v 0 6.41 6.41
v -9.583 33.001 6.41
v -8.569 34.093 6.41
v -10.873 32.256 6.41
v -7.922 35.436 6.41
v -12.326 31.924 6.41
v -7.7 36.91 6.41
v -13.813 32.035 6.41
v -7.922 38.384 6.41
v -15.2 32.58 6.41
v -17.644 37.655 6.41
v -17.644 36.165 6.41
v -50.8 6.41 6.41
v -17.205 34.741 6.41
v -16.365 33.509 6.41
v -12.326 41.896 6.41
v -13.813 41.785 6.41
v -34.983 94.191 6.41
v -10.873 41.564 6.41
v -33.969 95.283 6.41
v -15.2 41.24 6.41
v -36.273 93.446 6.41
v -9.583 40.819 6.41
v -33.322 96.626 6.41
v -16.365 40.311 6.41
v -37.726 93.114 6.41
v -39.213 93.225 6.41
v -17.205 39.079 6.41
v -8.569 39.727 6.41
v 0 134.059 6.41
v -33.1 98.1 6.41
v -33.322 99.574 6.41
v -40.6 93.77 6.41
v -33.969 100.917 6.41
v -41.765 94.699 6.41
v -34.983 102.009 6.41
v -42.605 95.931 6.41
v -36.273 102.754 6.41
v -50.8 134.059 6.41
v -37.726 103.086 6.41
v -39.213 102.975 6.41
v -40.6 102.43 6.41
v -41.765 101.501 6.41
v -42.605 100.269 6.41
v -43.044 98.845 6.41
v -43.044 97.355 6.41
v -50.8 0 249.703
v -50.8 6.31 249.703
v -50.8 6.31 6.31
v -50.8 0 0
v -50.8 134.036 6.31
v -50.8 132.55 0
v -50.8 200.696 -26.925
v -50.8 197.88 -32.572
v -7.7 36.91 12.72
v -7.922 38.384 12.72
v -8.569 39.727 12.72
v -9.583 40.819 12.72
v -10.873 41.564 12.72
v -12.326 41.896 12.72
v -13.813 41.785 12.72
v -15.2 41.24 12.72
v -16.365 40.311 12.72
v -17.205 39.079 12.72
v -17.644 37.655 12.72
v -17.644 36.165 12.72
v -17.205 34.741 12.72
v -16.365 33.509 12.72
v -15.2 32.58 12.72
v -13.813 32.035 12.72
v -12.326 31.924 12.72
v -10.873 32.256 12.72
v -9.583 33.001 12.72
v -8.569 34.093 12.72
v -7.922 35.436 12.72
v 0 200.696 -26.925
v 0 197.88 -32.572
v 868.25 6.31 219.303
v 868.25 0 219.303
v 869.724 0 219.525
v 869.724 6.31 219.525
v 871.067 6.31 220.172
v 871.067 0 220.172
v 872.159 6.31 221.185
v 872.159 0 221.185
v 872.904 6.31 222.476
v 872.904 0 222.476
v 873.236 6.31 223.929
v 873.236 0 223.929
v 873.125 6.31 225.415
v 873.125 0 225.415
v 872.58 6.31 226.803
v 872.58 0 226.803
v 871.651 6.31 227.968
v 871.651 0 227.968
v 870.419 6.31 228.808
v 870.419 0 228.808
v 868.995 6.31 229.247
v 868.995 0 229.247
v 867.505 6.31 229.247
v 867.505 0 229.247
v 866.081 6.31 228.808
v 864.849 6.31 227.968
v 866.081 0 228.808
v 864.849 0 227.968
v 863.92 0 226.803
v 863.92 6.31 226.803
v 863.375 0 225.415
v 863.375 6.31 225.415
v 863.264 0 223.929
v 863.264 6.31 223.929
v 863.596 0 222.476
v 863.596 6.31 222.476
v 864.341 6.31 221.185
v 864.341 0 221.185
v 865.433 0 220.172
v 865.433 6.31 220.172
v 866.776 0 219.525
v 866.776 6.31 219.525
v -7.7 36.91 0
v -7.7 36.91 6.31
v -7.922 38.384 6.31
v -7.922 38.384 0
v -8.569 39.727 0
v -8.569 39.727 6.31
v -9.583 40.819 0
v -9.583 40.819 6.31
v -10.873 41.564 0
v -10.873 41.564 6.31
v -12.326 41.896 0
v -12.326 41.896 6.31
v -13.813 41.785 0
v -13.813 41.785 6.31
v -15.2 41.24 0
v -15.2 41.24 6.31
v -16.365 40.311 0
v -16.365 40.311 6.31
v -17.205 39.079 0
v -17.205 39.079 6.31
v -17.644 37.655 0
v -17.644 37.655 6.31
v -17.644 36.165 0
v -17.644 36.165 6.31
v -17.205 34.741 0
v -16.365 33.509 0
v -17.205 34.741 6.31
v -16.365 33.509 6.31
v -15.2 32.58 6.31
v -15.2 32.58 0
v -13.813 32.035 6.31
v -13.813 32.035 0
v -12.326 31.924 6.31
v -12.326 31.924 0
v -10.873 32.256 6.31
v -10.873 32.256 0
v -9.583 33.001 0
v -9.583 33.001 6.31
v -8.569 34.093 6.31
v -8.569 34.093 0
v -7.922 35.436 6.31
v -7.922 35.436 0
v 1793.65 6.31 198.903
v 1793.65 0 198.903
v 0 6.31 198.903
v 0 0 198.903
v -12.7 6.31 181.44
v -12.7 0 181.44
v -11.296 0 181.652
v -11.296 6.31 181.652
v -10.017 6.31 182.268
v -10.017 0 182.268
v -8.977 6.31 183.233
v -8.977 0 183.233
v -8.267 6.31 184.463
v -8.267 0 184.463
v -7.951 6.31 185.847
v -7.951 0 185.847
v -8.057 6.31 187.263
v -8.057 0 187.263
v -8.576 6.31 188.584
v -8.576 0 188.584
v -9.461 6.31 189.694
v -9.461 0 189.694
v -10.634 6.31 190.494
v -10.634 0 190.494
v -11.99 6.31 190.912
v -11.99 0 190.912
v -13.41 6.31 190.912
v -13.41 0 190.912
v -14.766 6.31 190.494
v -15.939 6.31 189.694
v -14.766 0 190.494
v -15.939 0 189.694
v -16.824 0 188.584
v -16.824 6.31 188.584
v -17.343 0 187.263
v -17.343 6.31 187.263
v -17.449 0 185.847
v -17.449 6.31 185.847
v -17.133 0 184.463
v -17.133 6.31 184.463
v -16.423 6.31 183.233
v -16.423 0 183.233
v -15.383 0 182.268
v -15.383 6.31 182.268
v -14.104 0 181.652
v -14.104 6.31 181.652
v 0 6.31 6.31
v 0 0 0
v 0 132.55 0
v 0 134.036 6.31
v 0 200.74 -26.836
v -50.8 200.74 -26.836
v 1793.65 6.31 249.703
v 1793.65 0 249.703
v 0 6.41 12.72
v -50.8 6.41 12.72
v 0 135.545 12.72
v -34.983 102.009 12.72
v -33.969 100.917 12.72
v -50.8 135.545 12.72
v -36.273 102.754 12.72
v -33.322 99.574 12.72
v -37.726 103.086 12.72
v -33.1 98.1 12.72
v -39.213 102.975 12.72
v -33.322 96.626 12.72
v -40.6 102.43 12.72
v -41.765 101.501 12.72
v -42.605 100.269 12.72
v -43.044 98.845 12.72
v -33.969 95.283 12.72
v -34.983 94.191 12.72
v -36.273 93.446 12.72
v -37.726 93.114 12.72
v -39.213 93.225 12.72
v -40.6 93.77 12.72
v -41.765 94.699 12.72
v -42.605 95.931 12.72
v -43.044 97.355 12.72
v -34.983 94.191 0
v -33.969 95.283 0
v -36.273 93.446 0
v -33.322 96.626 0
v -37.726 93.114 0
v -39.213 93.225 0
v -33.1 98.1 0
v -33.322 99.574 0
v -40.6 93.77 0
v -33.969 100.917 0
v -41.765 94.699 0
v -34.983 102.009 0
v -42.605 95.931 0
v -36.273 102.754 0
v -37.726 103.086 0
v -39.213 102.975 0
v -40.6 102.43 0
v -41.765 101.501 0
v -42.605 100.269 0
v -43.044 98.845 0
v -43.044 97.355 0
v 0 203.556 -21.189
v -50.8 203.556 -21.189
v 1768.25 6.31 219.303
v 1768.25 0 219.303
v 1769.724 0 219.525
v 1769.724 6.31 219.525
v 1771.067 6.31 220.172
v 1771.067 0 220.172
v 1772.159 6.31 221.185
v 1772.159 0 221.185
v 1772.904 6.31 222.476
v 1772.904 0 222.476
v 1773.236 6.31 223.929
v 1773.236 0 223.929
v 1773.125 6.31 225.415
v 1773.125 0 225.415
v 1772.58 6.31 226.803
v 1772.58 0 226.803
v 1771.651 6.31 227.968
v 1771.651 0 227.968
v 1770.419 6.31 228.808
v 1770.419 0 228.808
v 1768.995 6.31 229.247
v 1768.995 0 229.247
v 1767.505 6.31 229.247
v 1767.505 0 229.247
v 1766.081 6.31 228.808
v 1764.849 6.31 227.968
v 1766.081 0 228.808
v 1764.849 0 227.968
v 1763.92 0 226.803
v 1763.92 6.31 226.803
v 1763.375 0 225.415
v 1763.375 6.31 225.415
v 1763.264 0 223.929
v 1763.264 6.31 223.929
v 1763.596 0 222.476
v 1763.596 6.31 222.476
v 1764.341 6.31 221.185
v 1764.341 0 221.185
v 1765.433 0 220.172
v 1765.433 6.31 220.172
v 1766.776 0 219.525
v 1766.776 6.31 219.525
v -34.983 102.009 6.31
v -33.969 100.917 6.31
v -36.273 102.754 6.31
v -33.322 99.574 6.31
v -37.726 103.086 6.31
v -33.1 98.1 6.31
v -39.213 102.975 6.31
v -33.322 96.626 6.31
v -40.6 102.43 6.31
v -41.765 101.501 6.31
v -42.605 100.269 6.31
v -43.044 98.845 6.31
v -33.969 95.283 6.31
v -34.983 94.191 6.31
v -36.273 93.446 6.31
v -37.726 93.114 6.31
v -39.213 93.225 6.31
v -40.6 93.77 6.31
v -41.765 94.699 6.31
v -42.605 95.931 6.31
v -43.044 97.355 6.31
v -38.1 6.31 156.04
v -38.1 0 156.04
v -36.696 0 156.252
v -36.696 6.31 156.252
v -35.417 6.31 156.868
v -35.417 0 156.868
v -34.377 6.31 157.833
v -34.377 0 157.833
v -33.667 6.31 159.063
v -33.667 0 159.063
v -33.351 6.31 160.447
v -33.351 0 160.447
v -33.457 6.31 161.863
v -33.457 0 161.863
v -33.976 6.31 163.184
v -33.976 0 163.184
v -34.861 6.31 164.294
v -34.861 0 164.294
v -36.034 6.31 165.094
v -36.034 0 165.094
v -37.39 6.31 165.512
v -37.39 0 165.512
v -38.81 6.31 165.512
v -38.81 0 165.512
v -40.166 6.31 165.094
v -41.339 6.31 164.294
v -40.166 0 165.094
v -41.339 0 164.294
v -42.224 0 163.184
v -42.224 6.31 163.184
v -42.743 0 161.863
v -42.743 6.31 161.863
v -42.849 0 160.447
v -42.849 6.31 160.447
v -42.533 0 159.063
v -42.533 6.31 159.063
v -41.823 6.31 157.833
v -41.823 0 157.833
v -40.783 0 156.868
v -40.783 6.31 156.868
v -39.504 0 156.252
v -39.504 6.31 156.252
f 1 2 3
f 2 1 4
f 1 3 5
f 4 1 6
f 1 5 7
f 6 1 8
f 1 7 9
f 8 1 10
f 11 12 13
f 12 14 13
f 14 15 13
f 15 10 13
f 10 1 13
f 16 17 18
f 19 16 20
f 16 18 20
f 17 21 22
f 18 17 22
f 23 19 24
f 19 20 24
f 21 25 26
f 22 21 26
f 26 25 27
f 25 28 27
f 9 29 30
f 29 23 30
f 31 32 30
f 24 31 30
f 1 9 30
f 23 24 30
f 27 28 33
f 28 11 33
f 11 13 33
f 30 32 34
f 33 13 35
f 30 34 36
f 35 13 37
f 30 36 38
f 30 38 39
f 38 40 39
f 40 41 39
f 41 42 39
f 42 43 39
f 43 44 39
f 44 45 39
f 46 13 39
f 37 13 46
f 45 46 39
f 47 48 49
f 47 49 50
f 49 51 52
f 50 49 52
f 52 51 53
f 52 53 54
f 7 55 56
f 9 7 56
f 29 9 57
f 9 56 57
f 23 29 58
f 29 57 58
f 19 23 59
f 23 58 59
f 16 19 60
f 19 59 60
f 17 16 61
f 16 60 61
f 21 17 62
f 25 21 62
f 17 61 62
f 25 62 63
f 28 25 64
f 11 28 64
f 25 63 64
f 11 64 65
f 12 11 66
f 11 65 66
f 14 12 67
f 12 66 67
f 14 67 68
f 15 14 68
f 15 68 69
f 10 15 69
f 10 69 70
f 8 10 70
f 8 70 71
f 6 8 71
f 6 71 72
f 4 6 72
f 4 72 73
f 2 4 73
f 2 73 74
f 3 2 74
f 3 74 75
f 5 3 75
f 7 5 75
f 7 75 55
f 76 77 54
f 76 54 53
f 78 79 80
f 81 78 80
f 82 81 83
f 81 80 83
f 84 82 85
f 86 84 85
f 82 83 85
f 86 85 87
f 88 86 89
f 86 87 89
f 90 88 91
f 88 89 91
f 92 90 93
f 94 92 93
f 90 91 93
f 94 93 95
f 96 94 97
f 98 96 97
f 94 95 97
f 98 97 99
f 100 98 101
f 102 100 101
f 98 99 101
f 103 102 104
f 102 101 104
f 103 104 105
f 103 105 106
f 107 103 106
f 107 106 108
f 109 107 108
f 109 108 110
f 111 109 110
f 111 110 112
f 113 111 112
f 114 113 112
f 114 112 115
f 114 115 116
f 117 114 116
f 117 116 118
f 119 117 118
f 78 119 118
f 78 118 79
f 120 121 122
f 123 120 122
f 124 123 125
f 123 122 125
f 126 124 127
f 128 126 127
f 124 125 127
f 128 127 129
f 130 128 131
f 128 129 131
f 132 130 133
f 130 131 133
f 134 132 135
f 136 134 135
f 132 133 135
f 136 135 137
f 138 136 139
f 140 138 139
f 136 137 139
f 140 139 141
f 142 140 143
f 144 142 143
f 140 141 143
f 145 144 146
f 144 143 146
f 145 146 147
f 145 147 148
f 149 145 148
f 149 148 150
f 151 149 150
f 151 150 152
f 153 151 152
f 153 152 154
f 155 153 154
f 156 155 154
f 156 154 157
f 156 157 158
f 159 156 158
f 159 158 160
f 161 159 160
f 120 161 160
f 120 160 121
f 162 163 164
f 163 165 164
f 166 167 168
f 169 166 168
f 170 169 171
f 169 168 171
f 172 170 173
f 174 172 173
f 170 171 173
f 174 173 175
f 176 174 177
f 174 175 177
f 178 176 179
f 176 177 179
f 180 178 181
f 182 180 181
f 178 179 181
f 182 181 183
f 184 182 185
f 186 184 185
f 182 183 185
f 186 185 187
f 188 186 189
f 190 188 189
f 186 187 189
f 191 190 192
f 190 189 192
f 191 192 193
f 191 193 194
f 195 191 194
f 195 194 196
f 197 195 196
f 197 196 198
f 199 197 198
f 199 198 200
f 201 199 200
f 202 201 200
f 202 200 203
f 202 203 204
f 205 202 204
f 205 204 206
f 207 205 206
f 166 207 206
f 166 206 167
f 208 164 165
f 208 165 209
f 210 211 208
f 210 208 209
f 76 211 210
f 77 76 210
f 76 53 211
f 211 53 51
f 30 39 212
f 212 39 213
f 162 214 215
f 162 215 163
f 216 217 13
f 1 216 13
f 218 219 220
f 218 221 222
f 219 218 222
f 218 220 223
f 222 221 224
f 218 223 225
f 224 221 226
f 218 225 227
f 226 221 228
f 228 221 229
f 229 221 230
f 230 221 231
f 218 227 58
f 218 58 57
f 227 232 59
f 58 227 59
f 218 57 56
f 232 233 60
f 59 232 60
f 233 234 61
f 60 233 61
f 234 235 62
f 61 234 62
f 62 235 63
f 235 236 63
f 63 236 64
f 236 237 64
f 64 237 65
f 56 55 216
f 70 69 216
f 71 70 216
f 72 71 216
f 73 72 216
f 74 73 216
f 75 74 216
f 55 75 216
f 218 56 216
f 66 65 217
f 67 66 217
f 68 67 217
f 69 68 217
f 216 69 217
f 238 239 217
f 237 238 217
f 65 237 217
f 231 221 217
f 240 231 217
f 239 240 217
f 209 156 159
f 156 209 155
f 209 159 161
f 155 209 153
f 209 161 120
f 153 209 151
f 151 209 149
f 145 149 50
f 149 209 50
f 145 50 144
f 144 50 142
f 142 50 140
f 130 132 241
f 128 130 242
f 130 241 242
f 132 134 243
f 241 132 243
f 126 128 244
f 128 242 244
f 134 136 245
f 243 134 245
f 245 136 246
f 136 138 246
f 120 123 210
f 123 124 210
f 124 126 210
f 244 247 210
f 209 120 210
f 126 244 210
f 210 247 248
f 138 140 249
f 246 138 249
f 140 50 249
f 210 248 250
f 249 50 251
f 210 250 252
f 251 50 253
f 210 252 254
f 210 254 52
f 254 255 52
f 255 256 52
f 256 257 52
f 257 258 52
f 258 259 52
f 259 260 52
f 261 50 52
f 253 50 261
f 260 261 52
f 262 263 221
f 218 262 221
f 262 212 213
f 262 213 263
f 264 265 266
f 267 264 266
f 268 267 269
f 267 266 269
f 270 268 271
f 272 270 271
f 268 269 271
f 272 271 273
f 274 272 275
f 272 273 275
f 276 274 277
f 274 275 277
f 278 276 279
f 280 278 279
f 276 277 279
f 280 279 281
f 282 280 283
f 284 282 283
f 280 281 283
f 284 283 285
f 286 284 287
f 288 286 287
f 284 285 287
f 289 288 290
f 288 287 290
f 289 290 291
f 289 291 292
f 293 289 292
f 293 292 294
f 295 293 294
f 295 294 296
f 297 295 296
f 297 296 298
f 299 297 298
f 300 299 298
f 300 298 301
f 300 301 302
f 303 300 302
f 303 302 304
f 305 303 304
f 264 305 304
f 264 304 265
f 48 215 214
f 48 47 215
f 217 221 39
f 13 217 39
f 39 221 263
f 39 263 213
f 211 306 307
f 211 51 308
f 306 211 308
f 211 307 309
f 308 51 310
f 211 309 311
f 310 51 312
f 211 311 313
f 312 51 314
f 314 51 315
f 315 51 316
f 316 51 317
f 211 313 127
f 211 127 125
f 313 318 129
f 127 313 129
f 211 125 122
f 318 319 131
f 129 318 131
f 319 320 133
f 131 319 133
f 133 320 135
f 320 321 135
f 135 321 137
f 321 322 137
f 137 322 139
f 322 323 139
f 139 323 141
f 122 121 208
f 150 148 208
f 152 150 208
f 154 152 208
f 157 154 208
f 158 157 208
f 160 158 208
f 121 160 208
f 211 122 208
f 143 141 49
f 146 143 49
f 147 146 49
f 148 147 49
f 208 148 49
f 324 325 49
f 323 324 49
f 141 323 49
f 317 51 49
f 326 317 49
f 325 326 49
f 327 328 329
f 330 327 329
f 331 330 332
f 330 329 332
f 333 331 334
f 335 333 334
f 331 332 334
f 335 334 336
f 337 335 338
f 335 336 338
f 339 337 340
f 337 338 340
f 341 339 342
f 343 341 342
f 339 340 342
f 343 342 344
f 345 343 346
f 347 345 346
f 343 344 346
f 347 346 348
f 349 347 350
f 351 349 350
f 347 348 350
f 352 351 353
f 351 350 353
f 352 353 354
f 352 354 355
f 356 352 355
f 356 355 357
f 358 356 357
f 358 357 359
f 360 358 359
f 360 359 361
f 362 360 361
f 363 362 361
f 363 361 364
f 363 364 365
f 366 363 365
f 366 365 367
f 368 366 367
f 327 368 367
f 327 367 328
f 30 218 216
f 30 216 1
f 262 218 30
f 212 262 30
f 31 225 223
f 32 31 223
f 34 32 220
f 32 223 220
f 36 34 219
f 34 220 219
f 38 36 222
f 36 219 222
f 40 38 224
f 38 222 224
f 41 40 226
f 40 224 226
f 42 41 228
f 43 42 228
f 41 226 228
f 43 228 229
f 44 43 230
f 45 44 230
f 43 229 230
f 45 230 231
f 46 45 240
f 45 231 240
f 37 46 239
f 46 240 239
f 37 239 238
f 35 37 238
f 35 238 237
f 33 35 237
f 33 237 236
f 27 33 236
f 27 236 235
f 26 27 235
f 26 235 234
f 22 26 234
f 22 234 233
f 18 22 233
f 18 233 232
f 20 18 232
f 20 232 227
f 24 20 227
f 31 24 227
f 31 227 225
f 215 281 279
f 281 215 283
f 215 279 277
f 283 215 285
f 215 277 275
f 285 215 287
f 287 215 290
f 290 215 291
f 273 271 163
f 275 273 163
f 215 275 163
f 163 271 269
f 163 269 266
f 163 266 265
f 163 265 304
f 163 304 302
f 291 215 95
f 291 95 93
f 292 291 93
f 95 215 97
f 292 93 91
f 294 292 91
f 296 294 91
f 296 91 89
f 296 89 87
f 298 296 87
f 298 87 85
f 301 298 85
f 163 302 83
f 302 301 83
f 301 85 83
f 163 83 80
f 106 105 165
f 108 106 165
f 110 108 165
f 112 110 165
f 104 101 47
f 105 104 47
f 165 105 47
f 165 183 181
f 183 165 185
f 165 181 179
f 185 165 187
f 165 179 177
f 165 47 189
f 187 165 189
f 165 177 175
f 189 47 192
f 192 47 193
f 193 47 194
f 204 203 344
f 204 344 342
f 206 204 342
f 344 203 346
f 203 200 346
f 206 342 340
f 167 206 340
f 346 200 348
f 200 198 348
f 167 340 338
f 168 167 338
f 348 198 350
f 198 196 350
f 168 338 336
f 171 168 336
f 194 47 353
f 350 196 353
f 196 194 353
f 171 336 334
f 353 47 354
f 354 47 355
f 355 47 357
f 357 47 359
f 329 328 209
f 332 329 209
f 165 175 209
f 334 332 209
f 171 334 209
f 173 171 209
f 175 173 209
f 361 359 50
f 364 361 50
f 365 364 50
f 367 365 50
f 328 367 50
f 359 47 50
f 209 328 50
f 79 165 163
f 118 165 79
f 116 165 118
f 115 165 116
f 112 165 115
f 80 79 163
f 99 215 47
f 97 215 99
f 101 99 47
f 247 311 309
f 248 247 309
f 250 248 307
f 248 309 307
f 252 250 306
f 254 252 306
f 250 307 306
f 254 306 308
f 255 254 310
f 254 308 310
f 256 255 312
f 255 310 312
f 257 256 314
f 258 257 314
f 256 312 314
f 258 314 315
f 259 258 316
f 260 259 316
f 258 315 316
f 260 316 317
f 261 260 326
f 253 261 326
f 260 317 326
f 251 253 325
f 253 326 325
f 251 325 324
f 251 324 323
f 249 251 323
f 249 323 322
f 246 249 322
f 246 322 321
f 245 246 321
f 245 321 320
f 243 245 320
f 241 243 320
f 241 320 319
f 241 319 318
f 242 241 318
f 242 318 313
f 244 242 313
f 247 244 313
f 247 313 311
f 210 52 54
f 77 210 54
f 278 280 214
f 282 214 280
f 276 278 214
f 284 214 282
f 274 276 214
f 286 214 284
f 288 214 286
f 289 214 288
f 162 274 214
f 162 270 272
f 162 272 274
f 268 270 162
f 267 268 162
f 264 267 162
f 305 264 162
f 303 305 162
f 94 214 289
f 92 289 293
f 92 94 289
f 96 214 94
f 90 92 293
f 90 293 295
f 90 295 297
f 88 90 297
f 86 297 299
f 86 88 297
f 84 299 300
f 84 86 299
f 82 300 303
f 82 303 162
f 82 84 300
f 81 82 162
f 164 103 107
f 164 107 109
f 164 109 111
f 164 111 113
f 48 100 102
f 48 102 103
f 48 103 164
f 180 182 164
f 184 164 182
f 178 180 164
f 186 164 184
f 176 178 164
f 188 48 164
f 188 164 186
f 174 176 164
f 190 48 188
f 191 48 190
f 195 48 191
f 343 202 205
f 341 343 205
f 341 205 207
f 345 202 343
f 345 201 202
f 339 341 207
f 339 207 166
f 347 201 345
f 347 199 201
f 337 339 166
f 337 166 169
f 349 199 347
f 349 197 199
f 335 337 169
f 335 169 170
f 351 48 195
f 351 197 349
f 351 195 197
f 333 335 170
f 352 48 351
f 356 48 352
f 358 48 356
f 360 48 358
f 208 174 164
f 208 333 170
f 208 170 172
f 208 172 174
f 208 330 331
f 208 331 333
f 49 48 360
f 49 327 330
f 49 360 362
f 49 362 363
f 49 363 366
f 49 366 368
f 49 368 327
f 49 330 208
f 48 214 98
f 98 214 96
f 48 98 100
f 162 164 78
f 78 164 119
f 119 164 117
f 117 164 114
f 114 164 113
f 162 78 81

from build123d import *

# Parameters (mm, degrees)
SALIENTE_EXTRUIR1_DEPTH = 6.31
SALIENTE_EXTRUIR2_DEPTH = 50.8
SALIENTE_EXTRUIR3_DEPTH = 50.8
CROQUIS4_W              = 50.8
CROQUIS4_H              = 6.31
SALIENTE_EXTRUIR4_DEPTH = 50.8
CROQUIS5_R              = 4.7625
CORTAR_EXTRUIR1_DEPTH   = 50
CROQUIS6_R              = 5
CORTAR_EXTRUIR2_DEPTH   = 50
CROQUIS7_R              = 5
CORTAR_EXTRUIR3_DEPTH   = 50
CROQUIS8_R              = 5
CORTAR_EXTRUIR4_DEPTH   = 24


with BuildPart() as part:
    # Croquis1 → Saliente-Extruir1 (new body)
    with BuildSketch(Plane(origin=(0, 0, 0), x_dir=(1, 0, 0), z_dir=(0, 1, 0))):
        Polygon((1742.85, -198.902795), (1742.85, -249.702795), (-50.8, -249.702795), (-50.8, 0), (0, 0), (0, -198.902795), align=None)
    extrude(amount=SALIENTE_EXTRUIR1_DEPTH)

    # Croquis2 → Saliente-Extruir2 (add)
    with BuildSketch(Plane.ZY.offset(50.8)):
        Polygon((0, 6.31), (0, 132.55), (-32.572440357, 197.880208397), (-26.925404535, 200.695716598), (6.31, 134.035807771), (6.31, 6.31), align=None)
    extrude(amount=-SALIENTE_EXTRUIR2_DEPTH)

    # Croquis4 → Saliente-Extruir4 (add)
    with BuildSketch(Plane(origin=(1742.85, 0, 0), x_dir=(0, 0, -1), z_dir=(1, 0, 0))):
        with Locations((-224.302795, 3.155)):
            Rectangle(CROQUIS4_W, CROQUIS4_H)
    extrude(amount=SALIENTE_EXTRUIR4_DEPTH)

    # Croquis5 → Cortar-Extruir1 (cut)
    with BuildSketch(Plane(origin=(0, 0, 0), x_dir=(-1, 0, 0), z_dir=(0, -1, 0))):
        with Locations(Location((38.1, -160.802795, 0), (0, 0, 90))):
            Circle(CROQUIS5_R)
        with Locations(Location((12.7, -186.202795, 0), (0, 0, 90))):
            Circle(CROQUIS5_R)
    extrude(amount=-CORTAR_EXTRUIR1_DEPTH, mode=Mode.SUBTRACT)

    # Croquis6 → Cortar-Extruir2 (cut)
    with BuildSketch(Plane(origin=(0, 0, 0), x_dir=(-1, 0, 0), z_dir=(0, -1, 0))):
        with Locations(Location((-868.250000079, -224.302795, 0), (0, 0, 90))):
            Circle(CROQUIS6_R)
    extrude(amount=-CORTAR_EXTRUIR2_DEPTH, mode=Mode.SUBTRACT)

    # Croquis7 → Cortar-Extruir3 (cut)
    with BuildSketch(Plane(origin=(0, 0, 0), x_dir=(-1, 0, 0), z_dir=(0, -1, 0))):
        with Locations(Location((-1768.25, -224.302795, 0), (0, 0, 90))):
            Circle(CROQUIS7_R)
    extrude(amount=-CORTAR_EXTRUIR3_DEPTH, mode=Mode.SUBTRACT)


with BuildPart() as body_2:
    # Croquis3 → Saliente-Extruir3 (new body)
    with BuildSketch(Plane.ZY.offset(50.8)):
        Polygon((6.41, 6.41), (6.41, 134.059354646), (-26.835911099, 200.740336379), (-21.188875277, 203.55584458), (12.72, 135.545162417), (12.72, 6.41), align=None)
    extrude(amount=-SALIENTE_EXTRUIR3_DEPTH)


with BuildPart() as cortar_extruir4_tool:
    # Croquis8 → Cortar-Extruir4 (new body)
    with BuildSketch(Plane.XY.offset(12.72)):
        with Locations((-38.1, 98.1)):
            Circle(CROQUIS8_R)
        with Locations((-12.7, 36.91)):
            Circle(CROQUIS8_R)
    extrude(amount=-CORTAR_EXTRUIR4_DEPTH)


with BuildPart() as part_1:
    add(part.part)

    # Cortar-Extruir4: cut by cortar_extruir4_tool
    add(cortar_extruir4_tool.part, mode=Mode.SUBTRACT)


with BuildPart() as body_2_1:
    add(body_2.part)

    # Cortar-Extruir4: cut by cortar_extruir4_tool
    add(cortar_extruir4_tool.part, mode=Mode.SUBTRACT)


solid = Compound([part_1.part, body_2_1.part])
